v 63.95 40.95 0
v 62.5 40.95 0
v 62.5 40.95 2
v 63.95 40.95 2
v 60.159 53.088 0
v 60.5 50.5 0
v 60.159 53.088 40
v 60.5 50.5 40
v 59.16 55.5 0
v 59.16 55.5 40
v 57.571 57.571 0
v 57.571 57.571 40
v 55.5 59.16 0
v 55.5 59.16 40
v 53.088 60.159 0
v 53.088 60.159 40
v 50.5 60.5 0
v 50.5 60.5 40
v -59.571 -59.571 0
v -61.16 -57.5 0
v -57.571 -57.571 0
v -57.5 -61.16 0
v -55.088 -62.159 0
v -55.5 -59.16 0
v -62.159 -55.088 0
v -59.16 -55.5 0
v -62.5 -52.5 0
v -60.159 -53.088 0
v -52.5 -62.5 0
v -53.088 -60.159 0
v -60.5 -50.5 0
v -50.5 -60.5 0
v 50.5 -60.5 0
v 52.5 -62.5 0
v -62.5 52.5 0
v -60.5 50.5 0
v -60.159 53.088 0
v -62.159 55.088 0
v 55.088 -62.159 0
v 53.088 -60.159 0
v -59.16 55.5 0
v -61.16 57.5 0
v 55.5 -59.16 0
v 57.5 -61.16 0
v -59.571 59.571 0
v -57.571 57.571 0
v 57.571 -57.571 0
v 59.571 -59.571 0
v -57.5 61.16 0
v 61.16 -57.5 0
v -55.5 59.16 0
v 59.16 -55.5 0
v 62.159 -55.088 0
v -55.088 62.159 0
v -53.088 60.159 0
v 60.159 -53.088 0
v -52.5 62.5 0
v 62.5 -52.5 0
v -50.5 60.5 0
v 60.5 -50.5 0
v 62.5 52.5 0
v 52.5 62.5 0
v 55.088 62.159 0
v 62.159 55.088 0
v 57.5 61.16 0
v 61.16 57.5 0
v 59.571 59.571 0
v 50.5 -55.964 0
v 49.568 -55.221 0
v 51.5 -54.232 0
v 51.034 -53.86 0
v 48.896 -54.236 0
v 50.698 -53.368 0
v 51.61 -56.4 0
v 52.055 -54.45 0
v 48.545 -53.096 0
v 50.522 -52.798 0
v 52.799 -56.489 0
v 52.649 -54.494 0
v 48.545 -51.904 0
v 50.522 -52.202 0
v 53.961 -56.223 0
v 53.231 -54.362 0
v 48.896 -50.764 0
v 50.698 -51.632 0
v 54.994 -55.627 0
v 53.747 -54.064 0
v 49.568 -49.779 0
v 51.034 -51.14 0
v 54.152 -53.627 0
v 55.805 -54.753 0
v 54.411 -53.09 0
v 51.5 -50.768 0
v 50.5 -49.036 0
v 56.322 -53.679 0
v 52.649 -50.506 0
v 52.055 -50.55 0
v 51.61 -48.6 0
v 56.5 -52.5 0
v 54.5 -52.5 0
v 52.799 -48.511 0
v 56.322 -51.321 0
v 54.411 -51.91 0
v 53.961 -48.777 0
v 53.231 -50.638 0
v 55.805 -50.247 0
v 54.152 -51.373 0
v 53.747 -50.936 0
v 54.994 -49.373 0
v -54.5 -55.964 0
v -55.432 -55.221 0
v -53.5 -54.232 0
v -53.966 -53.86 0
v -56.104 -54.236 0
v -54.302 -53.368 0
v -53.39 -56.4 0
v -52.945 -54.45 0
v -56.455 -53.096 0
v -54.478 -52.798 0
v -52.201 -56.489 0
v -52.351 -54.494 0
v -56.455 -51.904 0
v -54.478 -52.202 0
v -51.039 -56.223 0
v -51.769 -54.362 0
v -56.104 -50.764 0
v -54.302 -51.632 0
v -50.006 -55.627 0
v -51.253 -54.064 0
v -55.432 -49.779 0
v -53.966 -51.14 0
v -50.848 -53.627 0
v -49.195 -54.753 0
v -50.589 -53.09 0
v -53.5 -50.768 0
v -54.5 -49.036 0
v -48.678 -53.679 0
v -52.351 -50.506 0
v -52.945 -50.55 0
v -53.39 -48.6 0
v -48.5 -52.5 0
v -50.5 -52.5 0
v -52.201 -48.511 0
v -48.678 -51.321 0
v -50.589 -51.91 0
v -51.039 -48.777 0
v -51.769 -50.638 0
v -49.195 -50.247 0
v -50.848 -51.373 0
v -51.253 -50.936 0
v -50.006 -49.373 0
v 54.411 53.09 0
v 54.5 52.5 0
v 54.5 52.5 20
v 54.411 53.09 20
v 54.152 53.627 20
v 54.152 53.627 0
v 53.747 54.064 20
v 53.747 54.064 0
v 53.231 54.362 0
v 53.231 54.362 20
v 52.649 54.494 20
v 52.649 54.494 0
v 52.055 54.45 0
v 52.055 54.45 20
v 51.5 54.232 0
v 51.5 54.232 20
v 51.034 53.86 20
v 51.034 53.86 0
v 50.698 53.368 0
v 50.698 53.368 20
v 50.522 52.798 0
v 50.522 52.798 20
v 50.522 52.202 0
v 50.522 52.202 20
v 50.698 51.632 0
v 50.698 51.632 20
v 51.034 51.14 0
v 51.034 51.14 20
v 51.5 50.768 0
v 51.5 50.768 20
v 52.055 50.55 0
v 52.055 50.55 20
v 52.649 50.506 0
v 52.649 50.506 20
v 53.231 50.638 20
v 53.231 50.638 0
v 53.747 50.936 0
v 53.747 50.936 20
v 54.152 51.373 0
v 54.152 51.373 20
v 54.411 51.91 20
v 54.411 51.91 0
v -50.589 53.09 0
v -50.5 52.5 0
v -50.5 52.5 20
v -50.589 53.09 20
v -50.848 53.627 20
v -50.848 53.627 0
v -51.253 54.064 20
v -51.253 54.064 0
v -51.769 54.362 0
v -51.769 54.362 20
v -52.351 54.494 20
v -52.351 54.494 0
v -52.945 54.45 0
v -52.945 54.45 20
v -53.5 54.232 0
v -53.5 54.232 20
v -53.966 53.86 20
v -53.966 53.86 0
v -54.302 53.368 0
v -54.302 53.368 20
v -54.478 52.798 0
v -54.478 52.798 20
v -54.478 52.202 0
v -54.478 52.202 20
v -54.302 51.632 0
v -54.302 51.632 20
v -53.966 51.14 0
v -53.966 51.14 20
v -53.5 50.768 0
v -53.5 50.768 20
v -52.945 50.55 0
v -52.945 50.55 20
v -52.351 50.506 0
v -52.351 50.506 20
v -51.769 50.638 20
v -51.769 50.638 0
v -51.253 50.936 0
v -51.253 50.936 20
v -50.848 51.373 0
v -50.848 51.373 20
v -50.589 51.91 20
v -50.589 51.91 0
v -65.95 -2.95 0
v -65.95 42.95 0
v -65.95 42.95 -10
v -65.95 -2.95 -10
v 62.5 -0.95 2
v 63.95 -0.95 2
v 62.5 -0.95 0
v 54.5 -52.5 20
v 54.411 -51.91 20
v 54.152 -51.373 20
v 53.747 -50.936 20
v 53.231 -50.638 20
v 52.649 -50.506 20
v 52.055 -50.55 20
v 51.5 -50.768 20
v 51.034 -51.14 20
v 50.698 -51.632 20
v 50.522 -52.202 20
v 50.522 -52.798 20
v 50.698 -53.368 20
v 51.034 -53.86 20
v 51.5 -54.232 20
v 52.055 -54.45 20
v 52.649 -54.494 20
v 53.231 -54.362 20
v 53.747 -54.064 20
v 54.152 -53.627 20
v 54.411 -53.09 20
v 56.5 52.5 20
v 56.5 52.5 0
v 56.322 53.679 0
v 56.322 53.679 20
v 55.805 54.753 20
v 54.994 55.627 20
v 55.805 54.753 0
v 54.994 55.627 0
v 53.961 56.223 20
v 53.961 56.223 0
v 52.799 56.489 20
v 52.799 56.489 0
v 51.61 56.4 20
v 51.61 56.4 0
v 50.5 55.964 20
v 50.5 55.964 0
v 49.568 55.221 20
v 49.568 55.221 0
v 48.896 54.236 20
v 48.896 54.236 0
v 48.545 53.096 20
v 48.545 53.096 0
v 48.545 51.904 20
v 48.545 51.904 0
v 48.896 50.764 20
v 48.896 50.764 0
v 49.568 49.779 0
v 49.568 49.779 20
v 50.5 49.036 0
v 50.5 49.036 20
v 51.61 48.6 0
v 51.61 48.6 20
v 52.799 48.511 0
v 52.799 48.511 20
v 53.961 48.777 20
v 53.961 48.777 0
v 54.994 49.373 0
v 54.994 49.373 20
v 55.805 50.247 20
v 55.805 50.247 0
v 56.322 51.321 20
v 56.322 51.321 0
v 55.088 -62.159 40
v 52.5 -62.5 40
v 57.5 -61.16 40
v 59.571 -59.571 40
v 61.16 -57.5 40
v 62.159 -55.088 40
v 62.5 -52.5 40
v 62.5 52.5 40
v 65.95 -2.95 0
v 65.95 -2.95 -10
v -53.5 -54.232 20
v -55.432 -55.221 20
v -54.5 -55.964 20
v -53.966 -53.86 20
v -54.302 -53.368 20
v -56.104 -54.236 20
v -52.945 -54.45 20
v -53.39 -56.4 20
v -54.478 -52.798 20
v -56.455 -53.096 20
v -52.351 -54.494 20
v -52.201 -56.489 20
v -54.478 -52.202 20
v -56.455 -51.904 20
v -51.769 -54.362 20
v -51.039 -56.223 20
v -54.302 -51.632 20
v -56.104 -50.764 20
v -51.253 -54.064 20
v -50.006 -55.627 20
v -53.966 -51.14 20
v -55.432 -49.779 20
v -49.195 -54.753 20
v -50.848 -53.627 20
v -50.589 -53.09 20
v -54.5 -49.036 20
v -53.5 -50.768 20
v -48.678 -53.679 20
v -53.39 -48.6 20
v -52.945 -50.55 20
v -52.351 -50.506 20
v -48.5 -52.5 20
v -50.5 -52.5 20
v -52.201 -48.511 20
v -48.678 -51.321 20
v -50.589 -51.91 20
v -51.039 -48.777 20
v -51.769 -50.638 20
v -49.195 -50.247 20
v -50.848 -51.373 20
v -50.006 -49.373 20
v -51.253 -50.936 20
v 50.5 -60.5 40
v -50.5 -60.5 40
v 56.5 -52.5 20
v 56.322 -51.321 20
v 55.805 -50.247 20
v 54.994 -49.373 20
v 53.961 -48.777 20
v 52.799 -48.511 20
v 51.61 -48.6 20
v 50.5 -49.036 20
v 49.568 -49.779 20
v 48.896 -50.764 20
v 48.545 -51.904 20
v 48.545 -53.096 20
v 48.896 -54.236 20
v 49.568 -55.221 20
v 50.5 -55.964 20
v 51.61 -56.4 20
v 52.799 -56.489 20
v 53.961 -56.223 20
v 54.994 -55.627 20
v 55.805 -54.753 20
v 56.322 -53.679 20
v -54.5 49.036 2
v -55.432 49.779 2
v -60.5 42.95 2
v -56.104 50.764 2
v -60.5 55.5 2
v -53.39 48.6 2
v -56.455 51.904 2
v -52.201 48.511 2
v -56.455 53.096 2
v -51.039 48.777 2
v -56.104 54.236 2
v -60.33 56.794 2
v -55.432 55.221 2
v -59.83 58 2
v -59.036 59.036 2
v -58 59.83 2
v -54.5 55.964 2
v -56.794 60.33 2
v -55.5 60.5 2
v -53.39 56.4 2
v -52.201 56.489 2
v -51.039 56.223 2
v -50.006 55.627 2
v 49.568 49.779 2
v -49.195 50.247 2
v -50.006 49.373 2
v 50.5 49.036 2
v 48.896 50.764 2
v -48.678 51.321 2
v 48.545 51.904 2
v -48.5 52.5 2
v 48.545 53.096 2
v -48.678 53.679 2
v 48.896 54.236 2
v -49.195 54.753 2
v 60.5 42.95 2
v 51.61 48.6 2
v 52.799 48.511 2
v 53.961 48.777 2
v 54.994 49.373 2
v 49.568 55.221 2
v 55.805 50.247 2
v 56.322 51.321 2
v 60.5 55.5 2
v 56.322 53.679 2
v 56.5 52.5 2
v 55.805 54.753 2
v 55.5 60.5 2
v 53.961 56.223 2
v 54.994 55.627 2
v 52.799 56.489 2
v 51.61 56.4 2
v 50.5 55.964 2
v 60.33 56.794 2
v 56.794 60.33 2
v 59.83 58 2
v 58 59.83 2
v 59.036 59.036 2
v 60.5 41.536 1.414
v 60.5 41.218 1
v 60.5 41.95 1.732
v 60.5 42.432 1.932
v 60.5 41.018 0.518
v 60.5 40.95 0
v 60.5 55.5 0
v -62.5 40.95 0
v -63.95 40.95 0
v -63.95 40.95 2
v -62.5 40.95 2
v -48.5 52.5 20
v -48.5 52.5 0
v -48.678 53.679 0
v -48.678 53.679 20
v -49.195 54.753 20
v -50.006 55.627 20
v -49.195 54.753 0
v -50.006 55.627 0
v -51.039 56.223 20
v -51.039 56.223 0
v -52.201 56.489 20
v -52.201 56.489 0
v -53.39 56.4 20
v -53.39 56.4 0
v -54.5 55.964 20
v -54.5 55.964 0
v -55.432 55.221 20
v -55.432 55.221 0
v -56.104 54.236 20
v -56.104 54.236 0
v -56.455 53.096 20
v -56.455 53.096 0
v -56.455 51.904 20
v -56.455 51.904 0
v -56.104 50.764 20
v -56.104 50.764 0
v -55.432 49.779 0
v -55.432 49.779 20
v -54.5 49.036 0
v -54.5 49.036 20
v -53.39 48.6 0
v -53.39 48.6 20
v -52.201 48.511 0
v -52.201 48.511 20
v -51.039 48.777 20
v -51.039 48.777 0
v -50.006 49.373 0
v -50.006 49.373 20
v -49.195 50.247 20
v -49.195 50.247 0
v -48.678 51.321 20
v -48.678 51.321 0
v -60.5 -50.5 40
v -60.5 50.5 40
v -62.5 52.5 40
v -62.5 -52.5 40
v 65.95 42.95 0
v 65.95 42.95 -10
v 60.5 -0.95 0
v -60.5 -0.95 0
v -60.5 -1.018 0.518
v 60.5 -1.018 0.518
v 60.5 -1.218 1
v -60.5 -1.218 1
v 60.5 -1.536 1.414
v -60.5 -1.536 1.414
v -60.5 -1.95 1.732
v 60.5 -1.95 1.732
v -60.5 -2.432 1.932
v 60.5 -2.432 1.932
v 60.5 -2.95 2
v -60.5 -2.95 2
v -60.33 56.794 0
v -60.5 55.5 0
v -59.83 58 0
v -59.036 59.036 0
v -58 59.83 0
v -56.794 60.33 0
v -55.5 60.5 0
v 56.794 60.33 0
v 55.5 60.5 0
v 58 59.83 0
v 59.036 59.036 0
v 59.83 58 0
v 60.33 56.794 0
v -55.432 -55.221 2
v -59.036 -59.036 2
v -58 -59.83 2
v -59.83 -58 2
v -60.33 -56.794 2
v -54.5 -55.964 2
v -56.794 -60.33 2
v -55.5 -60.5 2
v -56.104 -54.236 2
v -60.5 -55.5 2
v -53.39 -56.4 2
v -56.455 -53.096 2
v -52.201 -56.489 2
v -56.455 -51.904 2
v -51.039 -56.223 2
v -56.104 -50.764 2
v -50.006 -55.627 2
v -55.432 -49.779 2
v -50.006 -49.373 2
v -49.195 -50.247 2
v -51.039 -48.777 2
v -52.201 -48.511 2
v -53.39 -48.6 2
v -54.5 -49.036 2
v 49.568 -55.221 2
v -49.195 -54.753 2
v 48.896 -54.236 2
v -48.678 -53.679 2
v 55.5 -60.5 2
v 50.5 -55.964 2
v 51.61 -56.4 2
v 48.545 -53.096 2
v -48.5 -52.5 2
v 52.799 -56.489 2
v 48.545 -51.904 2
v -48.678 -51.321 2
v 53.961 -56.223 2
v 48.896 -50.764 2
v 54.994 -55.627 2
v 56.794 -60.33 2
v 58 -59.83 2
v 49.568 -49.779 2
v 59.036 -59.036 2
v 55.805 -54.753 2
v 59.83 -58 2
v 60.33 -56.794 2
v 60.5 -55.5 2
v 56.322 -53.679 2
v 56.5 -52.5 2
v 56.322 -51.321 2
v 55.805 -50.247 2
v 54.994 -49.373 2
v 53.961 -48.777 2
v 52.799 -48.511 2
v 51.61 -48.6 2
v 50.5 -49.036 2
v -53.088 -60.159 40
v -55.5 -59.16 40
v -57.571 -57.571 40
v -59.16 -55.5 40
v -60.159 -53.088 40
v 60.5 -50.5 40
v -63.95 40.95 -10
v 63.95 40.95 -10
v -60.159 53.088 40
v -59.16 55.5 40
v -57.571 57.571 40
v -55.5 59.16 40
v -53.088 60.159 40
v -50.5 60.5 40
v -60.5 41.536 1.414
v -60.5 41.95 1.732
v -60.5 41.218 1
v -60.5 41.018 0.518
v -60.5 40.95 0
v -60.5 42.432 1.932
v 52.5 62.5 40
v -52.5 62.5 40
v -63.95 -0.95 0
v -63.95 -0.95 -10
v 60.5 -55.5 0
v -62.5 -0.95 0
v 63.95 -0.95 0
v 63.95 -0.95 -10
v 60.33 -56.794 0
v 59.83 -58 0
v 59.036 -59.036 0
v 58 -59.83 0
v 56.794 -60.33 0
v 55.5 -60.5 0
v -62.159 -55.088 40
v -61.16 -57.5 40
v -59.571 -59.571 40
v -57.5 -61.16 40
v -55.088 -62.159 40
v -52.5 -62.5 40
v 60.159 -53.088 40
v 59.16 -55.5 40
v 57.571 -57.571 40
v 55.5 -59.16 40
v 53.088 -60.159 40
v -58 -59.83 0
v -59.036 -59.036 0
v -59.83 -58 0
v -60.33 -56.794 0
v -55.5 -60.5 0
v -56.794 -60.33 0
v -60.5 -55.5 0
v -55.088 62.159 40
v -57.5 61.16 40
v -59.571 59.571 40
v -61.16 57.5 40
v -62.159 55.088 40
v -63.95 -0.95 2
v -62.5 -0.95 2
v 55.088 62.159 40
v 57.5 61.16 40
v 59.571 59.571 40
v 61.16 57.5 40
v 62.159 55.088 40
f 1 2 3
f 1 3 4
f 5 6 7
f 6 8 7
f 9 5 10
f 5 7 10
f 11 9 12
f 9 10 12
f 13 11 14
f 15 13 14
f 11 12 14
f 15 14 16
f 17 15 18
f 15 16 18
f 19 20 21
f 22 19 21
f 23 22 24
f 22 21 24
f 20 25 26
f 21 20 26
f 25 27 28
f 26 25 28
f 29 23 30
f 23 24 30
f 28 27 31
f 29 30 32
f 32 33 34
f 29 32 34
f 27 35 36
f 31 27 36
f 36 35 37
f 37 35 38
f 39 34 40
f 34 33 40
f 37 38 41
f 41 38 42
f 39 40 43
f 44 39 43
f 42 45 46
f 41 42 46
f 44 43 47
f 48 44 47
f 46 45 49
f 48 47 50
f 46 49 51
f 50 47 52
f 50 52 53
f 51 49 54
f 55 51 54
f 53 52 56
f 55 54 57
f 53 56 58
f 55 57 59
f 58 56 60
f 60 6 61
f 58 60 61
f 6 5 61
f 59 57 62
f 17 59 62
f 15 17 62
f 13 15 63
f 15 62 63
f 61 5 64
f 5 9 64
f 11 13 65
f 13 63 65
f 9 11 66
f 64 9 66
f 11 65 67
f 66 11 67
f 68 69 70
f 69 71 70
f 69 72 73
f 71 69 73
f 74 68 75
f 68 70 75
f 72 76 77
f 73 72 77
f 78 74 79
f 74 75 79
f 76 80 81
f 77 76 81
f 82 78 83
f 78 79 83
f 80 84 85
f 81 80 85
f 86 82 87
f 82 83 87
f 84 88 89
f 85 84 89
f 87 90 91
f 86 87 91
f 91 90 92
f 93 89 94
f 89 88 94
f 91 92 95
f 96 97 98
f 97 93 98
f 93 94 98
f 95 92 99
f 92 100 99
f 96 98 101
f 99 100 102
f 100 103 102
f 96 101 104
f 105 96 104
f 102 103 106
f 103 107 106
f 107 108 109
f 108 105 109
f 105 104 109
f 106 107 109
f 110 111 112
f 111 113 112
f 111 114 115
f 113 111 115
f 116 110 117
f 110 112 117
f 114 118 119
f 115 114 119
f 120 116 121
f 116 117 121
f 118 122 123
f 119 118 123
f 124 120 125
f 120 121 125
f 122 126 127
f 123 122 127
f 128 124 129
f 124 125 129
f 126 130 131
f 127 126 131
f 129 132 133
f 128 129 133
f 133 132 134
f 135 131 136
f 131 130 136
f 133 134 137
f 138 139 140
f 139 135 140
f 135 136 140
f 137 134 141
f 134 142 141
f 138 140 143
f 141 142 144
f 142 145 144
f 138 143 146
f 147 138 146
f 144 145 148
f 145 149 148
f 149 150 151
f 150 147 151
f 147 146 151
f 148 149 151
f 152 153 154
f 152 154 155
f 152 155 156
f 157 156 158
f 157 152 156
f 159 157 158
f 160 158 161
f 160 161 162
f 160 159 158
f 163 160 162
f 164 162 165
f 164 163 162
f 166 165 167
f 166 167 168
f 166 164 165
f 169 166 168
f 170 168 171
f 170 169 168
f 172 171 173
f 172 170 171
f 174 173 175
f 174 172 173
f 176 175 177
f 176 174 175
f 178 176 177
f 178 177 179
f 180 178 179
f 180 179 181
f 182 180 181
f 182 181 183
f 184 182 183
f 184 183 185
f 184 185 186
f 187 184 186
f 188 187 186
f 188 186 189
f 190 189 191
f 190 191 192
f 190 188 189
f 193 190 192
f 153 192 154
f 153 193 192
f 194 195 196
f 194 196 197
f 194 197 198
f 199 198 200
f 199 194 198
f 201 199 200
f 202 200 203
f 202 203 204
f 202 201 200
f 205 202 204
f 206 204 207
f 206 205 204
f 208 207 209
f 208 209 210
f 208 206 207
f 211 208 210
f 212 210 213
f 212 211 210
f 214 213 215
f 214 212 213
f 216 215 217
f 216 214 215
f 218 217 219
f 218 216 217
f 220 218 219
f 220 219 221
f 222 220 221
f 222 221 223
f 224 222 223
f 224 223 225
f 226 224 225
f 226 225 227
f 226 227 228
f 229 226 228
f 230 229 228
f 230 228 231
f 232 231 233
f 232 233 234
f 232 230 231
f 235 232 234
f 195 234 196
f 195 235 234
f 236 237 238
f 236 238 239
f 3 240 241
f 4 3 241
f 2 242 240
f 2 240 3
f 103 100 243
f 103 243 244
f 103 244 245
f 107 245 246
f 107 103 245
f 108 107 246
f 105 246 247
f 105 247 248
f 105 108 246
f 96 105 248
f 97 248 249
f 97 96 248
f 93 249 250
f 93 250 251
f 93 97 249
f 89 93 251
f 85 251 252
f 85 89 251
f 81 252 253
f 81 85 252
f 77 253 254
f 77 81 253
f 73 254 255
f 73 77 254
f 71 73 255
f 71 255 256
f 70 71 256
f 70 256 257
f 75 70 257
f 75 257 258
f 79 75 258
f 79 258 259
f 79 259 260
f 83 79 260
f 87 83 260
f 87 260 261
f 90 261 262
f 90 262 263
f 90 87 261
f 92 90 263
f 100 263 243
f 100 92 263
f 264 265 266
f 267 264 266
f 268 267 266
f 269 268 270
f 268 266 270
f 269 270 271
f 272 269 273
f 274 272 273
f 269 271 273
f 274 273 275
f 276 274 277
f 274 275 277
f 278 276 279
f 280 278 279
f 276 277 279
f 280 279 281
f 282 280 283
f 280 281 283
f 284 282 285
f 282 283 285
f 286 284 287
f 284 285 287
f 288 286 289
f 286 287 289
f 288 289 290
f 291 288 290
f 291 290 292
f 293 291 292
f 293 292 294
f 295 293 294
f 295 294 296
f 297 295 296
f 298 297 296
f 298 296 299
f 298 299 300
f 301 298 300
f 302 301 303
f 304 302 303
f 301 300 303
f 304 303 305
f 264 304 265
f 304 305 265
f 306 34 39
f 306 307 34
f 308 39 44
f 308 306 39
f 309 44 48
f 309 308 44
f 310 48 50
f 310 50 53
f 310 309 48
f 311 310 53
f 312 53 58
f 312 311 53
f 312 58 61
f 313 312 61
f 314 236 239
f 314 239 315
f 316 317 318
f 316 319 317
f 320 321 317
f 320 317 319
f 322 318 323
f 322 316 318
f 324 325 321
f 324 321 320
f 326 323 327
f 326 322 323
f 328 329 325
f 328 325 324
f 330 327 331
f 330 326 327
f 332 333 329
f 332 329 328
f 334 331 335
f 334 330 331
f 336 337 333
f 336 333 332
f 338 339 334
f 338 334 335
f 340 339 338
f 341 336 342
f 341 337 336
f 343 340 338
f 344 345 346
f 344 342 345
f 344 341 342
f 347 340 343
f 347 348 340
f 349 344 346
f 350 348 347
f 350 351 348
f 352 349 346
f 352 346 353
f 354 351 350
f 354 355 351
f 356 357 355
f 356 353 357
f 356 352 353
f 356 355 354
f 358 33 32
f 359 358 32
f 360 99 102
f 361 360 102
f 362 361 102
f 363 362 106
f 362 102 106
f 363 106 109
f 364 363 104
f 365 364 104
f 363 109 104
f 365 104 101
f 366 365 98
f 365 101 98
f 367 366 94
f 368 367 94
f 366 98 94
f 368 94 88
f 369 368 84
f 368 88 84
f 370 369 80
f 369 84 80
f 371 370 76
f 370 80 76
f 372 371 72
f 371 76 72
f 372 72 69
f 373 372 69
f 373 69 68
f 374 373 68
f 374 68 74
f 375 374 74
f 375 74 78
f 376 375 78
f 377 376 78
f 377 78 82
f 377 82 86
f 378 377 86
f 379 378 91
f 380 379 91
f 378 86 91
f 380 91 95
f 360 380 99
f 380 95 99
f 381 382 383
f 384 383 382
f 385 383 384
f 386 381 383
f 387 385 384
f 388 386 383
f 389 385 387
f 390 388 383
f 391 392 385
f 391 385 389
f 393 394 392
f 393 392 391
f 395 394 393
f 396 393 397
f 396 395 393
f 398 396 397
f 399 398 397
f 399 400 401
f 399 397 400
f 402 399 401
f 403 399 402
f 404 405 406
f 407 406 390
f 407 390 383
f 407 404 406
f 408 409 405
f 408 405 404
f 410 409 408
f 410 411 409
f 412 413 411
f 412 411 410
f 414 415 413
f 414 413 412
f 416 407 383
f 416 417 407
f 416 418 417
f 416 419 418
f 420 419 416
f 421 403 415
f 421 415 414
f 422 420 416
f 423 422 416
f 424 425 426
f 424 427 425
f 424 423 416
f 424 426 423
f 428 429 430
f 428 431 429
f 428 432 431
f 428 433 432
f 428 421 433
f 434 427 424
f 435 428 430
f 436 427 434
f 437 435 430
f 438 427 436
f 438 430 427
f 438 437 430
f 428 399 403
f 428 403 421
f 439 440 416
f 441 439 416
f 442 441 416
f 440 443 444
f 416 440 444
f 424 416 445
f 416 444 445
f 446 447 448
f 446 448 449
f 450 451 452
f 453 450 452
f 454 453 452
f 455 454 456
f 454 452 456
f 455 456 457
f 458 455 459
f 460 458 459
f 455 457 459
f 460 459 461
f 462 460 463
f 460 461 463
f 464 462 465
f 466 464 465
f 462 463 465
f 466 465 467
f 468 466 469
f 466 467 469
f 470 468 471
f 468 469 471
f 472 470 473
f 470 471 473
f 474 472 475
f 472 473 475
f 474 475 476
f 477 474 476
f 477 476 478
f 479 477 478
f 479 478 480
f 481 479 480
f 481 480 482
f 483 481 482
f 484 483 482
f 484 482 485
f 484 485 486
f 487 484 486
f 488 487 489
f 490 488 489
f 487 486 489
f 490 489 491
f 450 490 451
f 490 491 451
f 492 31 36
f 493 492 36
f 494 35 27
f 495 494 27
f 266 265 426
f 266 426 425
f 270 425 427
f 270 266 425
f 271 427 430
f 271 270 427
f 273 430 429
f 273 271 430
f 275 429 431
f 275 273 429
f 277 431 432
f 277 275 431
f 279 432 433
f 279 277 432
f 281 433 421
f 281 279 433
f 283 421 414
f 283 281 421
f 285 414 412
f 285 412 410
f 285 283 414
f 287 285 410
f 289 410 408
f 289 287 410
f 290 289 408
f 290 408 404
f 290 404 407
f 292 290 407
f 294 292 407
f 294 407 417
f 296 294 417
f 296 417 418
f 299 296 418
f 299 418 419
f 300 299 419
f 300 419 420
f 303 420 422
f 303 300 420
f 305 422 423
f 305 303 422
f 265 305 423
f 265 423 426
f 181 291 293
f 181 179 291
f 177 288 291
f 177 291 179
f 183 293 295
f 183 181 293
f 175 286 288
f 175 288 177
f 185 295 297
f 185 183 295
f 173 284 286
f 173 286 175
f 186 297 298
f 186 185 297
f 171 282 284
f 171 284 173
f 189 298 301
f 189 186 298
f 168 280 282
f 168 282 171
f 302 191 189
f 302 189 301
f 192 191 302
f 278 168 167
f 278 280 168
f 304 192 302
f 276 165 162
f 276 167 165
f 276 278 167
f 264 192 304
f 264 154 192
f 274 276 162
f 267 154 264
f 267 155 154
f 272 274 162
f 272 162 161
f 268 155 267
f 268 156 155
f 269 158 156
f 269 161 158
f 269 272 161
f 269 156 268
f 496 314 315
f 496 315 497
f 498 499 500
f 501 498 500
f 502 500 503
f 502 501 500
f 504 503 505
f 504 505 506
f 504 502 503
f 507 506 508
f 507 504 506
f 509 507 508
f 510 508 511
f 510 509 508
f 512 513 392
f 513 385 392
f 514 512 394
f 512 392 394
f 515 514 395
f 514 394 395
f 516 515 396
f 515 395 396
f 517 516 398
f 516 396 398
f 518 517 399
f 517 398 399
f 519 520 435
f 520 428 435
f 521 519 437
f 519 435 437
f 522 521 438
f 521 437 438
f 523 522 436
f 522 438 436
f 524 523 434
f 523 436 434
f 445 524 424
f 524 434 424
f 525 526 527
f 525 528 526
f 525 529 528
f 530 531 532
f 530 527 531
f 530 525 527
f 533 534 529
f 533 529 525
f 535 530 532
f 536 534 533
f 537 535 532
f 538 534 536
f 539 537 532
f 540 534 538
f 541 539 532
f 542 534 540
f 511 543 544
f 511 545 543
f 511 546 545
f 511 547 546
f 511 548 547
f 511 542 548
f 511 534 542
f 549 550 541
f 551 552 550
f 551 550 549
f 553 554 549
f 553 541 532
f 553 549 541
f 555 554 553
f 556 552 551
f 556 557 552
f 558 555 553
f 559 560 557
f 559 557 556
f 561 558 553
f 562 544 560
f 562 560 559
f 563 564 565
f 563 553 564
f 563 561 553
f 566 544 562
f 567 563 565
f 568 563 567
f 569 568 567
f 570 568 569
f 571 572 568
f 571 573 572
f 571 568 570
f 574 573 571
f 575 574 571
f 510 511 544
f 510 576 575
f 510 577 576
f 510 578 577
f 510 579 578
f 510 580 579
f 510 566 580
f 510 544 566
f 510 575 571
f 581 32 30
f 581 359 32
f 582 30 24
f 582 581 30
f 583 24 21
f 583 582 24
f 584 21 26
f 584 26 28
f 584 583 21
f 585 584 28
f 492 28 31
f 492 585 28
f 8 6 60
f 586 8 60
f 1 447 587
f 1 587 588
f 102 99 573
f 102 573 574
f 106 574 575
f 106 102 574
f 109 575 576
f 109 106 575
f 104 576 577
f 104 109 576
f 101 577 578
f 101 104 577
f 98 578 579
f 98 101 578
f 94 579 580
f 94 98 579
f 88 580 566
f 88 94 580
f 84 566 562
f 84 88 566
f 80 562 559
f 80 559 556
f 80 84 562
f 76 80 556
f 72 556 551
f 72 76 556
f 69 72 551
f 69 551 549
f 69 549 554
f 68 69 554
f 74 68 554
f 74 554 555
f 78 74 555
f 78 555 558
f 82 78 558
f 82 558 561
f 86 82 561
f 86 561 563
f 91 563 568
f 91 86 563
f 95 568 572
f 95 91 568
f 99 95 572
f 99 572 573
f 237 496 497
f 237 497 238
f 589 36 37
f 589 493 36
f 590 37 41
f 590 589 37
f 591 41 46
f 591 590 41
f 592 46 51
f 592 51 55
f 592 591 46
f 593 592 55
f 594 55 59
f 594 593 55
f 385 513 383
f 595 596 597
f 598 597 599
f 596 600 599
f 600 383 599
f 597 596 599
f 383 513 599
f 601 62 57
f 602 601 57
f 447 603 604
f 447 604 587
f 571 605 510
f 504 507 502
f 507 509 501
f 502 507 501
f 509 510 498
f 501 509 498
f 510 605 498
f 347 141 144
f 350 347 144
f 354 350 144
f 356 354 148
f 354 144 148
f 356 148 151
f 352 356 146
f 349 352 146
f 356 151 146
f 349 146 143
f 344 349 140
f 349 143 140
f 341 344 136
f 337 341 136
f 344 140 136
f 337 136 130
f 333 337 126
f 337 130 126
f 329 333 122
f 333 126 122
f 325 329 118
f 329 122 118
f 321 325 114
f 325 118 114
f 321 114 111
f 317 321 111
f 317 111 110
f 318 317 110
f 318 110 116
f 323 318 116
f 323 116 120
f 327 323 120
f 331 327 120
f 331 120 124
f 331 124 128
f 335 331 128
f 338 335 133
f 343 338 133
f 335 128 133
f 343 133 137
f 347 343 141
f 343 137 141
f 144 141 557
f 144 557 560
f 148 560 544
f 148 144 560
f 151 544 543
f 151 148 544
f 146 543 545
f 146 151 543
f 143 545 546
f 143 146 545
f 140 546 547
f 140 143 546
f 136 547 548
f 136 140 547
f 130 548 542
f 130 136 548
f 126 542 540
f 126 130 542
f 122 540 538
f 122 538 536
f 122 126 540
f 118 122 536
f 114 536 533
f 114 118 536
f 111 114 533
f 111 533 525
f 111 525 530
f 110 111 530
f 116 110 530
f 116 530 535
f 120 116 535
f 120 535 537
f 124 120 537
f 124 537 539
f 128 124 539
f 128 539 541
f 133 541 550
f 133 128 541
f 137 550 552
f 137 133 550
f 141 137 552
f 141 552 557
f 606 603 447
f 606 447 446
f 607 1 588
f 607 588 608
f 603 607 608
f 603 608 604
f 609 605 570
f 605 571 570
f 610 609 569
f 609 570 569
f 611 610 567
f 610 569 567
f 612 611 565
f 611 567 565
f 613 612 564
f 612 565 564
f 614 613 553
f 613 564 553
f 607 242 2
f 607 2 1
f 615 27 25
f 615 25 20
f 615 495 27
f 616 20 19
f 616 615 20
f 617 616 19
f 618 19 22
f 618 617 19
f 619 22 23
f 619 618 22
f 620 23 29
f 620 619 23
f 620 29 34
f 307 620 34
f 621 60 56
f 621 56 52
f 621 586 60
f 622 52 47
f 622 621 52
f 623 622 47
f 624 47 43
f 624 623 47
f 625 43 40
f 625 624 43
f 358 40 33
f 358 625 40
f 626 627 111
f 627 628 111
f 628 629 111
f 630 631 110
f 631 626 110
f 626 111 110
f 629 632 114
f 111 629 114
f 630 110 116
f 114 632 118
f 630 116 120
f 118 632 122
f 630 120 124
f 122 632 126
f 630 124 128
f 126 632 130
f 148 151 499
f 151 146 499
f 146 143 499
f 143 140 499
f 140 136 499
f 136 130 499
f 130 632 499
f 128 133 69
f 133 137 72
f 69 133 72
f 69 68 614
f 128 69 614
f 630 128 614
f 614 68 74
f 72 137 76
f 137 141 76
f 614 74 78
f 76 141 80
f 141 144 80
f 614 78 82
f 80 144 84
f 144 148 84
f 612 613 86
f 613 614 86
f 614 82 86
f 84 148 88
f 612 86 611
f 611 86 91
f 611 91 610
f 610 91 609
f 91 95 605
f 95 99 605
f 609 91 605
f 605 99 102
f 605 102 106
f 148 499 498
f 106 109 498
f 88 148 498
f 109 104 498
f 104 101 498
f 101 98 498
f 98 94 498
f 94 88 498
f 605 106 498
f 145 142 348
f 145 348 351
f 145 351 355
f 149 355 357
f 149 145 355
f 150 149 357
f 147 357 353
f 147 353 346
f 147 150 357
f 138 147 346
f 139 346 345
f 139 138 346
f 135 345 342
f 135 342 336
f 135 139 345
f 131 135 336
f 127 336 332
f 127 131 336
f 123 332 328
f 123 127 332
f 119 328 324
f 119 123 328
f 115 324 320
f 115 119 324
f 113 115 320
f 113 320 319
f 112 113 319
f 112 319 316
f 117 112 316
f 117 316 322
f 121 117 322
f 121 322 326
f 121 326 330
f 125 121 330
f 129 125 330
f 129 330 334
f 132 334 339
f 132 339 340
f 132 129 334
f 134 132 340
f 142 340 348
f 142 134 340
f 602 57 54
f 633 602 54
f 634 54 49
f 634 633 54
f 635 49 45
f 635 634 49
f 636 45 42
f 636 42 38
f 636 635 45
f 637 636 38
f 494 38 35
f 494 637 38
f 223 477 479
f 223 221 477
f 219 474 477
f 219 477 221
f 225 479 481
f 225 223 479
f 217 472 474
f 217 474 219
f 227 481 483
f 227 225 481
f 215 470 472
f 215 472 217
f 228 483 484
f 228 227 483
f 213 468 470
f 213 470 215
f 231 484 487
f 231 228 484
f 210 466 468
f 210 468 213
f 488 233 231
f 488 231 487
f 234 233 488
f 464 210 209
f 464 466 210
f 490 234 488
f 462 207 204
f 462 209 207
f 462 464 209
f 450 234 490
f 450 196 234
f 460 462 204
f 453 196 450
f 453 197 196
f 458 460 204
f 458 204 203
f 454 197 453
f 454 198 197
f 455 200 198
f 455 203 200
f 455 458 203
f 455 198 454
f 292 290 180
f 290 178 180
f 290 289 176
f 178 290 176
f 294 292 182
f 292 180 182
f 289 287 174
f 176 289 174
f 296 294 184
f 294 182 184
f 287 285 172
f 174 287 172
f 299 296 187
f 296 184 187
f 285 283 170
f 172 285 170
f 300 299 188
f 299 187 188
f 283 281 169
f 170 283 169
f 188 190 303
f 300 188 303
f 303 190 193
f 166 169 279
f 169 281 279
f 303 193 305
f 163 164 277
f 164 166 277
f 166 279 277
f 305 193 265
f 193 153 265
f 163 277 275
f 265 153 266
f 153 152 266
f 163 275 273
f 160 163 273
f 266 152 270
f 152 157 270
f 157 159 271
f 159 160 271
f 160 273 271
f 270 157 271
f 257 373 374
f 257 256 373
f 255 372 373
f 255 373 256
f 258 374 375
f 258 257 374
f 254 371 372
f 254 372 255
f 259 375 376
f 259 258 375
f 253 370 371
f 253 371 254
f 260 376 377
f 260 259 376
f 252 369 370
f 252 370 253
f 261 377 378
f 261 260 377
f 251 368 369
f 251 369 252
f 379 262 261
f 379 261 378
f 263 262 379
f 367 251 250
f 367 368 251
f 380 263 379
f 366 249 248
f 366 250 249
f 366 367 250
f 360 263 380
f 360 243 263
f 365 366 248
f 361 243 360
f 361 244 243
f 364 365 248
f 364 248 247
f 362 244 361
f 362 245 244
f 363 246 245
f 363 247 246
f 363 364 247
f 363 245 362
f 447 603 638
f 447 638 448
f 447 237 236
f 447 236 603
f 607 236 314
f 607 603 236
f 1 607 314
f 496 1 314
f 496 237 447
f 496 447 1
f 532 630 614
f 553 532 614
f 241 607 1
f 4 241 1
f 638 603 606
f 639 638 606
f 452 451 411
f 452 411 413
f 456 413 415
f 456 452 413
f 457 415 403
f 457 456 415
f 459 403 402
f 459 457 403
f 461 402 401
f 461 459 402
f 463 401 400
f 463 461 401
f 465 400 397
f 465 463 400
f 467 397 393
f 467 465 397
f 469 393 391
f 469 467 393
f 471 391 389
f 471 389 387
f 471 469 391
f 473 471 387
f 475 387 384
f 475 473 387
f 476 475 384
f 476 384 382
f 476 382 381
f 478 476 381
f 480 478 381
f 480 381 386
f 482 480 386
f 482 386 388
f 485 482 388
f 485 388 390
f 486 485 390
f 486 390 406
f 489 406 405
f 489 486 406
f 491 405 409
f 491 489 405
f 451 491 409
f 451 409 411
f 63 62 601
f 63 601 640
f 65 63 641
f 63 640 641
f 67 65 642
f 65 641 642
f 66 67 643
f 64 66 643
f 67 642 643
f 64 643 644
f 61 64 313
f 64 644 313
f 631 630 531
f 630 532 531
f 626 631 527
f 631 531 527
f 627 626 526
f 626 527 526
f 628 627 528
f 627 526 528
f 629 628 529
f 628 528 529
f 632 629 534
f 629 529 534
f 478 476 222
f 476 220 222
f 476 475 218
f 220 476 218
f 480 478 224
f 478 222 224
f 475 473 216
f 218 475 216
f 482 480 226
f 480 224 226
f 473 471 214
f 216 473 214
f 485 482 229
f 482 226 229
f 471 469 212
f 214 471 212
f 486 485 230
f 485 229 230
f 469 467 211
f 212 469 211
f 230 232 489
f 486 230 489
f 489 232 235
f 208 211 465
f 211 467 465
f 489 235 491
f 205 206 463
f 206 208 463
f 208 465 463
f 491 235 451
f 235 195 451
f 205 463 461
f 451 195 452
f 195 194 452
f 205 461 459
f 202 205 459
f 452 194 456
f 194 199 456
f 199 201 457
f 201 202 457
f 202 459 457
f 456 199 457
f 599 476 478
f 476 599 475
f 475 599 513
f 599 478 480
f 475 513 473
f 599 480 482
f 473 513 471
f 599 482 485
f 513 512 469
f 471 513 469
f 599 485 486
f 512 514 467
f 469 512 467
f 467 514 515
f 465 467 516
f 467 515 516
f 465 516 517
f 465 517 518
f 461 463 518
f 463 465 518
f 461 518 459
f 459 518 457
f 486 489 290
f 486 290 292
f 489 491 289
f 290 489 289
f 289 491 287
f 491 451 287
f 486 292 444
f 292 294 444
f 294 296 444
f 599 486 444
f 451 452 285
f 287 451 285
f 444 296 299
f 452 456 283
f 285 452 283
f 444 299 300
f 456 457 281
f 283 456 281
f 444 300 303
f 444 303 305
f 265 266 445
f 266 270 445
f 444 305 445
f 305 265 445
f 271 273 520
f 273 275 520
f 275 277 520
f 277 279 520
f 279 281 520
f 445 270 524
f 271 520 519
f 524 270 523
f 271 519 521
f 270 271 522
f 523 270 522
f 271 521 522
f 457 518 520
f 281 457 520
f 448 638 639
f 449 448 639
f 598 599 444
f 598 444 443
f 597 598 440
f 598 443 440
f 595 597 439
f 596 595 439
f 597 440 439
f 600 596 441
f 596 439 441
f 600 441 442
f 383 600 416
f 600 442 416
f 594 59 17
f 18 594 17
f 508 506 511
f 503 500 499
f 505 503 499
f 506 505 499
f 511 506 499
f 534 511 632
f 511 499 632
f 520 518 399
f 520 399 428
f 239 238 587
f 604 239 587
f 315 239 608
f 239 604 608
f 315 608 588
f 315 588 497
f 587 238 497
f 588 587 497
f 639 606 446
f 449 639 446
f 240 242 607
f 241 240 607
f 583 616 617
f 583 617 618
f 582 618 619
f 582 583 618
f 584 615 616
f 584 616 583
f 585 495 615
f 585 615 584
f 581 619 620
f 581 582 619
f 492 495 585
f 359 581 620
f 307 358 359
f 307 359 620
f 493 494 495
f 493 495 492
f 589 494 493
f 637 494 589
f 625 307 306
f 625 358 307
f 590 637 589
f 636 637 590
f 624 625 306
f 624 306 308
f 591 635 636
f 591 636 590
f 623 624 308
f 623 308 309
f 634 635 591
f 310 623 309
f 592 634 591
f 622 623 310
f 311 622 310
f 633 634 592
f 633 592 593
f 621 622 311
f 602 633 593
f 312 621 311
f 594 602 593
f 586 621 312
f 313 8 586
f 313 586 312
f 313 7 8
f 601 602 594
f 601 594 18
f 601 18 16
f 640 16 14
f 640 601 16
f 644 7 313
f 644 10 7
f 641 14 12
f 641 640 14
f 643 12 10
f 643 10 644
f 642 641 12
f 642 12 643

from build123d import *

# Parameters (mm, degrees)
F0_W     = 121
F0_H     = 17.55
F0_R     = 4
F0_H_2   = 2
F1_DEPTH = 2
F0_H_3   = 57.55
F0_W_2   = 1.45
F0_H_4   = 41.9
F0_W_3   = 2
F2_DEPTH = 40
F0_R_2   = 2
F3_DEPTH = 20
F4_DEPTH = 10
F5_R     = 10
F6_R     = 1.99999
F6_2_R   = 1.99999
F7_R     = 5
F7_2_R   = 5


# Not quite as in the source:
# - a fillet or chamfer is up to 0.001 mm smaller than in the source, because OpenCascade refuses the exact size


with BuildPart() as f1:
    # F0 (on Top) → F1 (new body)
    with BuildSketch(Plane.XY):
        with Locations((0, 51.725)):
            Rectangle(F0_W, F0_H)
        with Locations((-52.5, 52.5)):
            Circle(F0_R, mode=Mode.SUBTRACT)
        with Locations((52.5, 52.5)):
            Circle(F0_R, mode=Mode.SUBTRACT)
        with Locations((0, 41.95)):
            Rectangle(F0_W, F0_H_2)
    extrude(amount=F1_DEPTH)

    # F6#2 (radius 2 in the source; OpenCascade refuses exactly that, so slightly less here)
    f6_2_edges = [f1.edges().sort_by_distance(p)[0] for p in [
        (0, 40.95, 2),
    ]]
    fillet(f6_2_edges, radius=F6_2_R)

    # F7
    f7_edges = [f1.edges().sort_by_distance(p)[0] for p in [
        (60.5, 60.5, 1),
        (-60.5, 60.5, 1),
    ]]
    fillet(f7_edges, radius=F7_R)


with BuildPart() as f1b:
    # F0 (on Top) → F1, piece 2 (new body)
    with BuildSketch(Plane.XY):
        with Locations((0, -31.725)):
            Rectangle(F0_W, F0_H_3)
        with Locations((-52.5, -52.5)):
            Circle(F0_R, mode=Mode.SUBTRACT)
        with Locations((52.5, -52.5)):
            Circle(F0_R, mode=Mode.SUBTRACT)
        with Locations((0, -1.95)):
            Rectangle(F0_W, F0_H_2)
    extrude(amount=F1_DEPTH)

    # F6 (radius 2 in the source; OpenCascade refuses exactly that, so slightly less here)
    f6_edges = [f1b.edges().sort_by_distance(p)[0] for p in [
        (0, -0.95, 2),
    ]]
    fillet(f6_edges, radius=F6_R)

    # F7#2
    f7_2_edges = [f1b.edges().sort_by_distance(p)[0] for p in [
        (-60.5, -60.5, 1),
        (60.5, -60.5, 1),
    ]]
    fillet(f7_2_edges, radius=F7_2_R)


with BuildPart() as f1c:
    # F0 (on Top) → F1, piece 3 (new body)
    with BuildSketch(Plane.XY):
        with Locations((-63.225, 20)):
            Rectangle(F0_W_2, F0_H_4)
    extrude(amount=F1_DEPTH)


with BuildPart() as f1d:
    # F0 (on Top) → F1, piece 4 (new body)
    with BuildSketch(Plane.XY):
        with Locations((63.225, 20)):
            Rectangle(F0_W_2, F0_H_4)
    extrude(amount=F1_DEPTH)


with BuildPart() as f2:
    # F0 (on Top) → F2 (new body)
    with BuildSketch(Plane.XY):
        Polygon((60.5, 60.5), (60.5, 42.95), (62.5, 42.95), (62.5, 62.5), (-62.5, 62.5), (-62.5, 42.95), (-60.5, 42.95), (-60.5, 60.5), align=None)
        with Locations((-61.5, 41.95)):
            Rectangle(F0_W_3, F0_H_2)
        with Locations((-61.5, 20)):
            Rectangle(F0_W_3, F0_H_4)
        Polygon((60.5, -2.95), (60.5, -60.5), (-60.5, -60.5), (-60.5, -2.95), (-62.5, -2.95), (-62.5, -62.5), (62.5, -62.5), (62.5, -2.95), align=None)
        with Locations((-61.5, -1.95)):
            Rectangle(F0_W_3, F0_H_2)
        with Locations((61.5, -1.95)):
            Rectangle(F0_W_3, F0_H_2)
        with Locations((61.5, 20)):
            Rectangle(F0_W_3, F0_H_4)
        with Locations((61.5, 41.95)):
            Rectangle(F0_W_3, F0_H_2)
    extrude(amount=F2_DEPTH)

    # F5
    f5_edges = [f2.edges().sort_by_distance(p)[0] for p in [
        (-60.5, 60.5, 20),
        (60.5, 60.5, 20),
        (-60.5, -60.5, 20),
        (60.5, -60.5, 20),
        (-62.5, 62.5, 20),
        (62.5, 62.5, 20),
        (62.5, -62.5, 20),
        (-62.5, -62.5, 20),
    ]]
    fillet(f5_edges, radius=F5_R)


with BuildPart() as f3:
    # F0 (on Top) → F3 (new body)
    with BuildSketch(Plane.XY):
        with Locations((-52.5, 52.5)):
            Circle(F0_R)
        with Locations((-52.5, 52.5)):
            Circle(F0_R_2, mode=Mode.SUBTRACT)
    extrude(amount=F3_DEPTH)


with BuildPart() as f3b:
    # F0 (on Top) → F3, piece 2 (new body)
    with BuildSketch(Plane.XY):
        with Locations((52.5, 52.5)):
            Circle(F0_R)
        with Locations((52.5, 52.5)):
            Circle(F0_R_2, mode=Mode.SUBTRACT)
    extrude(amount=F3_DEPTH)


with BuildPart() as f3c:
    # F0 (on Top) → F3, piece 3 (new body)
    with BuildSketch(Plane.XY):
        with Locations((52.5, -52.5)):
            Circle(F0_R)
        with Locations((52.5, -52.5)):
            Circle(F0_R_2, mode=Mode.SUBTRACT)
    extrude(amount=F3_DEPTH)


with BuildPart() as f3d:
    # F0 (on Top) → F3, piece 4 (new body)
    with BuildSketch(Plane.XY):
        with Locations((-52.5, -52.5)):
            Circle(F0_R)
        with Locations((-52.5, -52.5)):
            Circle(F0_R_2, mode=Mode.SUBTRACT)
    extrude(amount=F3_DEPTH)


with BuildPart() as f4:
    # F0 (on Top) → F4 (new body)
    with BuildSketch(Plane.XY):
        Polygon((-65.95, -2.95), (-62.5, -2.95), (-62.5, -0.95), (-63.95, -0.95), (-63.95, 40.95), (-62.5, 40.95), (-62.5, 42.95), (-65.95, 42.95), align=None)
        with Locations((-61.5, -1.95)):
            Rectangle(F0_W_3, F0_H_2)
        with Locations((-61.5, 41.95)):
            Rectangle(F0_W_3, F0_H_2)
        with Locations((0, -1.95)):
            Rectangle(F0_W, F0_H_2)
        with Locations((0, 41.95)):
            Rectangle(F0_W, F0_H_2)
        with Locations((61.5, -1.95)):
            Rectangle(F0_W_3, F0_H_2)
        with Locations((61.5, 41.95)):
            Rectangle(F0_W_3, F0_H_2)
        Polygon((62.5, -0.95), (62.5, -2.95), (65.95, -2.95), (65.95, 42.95), (62.5, 42.95), (62.5, 40.95), (63.95, 40.95), (63.95, -0.95), align=None)
    extrude(amount=-F4_DEPTH)


solid = Compound([f1.part, f1b.part, f1c.part, f1d.part, f2.part, f3.part, f3b.part, f3c.part, f3d.part, f4.part])
